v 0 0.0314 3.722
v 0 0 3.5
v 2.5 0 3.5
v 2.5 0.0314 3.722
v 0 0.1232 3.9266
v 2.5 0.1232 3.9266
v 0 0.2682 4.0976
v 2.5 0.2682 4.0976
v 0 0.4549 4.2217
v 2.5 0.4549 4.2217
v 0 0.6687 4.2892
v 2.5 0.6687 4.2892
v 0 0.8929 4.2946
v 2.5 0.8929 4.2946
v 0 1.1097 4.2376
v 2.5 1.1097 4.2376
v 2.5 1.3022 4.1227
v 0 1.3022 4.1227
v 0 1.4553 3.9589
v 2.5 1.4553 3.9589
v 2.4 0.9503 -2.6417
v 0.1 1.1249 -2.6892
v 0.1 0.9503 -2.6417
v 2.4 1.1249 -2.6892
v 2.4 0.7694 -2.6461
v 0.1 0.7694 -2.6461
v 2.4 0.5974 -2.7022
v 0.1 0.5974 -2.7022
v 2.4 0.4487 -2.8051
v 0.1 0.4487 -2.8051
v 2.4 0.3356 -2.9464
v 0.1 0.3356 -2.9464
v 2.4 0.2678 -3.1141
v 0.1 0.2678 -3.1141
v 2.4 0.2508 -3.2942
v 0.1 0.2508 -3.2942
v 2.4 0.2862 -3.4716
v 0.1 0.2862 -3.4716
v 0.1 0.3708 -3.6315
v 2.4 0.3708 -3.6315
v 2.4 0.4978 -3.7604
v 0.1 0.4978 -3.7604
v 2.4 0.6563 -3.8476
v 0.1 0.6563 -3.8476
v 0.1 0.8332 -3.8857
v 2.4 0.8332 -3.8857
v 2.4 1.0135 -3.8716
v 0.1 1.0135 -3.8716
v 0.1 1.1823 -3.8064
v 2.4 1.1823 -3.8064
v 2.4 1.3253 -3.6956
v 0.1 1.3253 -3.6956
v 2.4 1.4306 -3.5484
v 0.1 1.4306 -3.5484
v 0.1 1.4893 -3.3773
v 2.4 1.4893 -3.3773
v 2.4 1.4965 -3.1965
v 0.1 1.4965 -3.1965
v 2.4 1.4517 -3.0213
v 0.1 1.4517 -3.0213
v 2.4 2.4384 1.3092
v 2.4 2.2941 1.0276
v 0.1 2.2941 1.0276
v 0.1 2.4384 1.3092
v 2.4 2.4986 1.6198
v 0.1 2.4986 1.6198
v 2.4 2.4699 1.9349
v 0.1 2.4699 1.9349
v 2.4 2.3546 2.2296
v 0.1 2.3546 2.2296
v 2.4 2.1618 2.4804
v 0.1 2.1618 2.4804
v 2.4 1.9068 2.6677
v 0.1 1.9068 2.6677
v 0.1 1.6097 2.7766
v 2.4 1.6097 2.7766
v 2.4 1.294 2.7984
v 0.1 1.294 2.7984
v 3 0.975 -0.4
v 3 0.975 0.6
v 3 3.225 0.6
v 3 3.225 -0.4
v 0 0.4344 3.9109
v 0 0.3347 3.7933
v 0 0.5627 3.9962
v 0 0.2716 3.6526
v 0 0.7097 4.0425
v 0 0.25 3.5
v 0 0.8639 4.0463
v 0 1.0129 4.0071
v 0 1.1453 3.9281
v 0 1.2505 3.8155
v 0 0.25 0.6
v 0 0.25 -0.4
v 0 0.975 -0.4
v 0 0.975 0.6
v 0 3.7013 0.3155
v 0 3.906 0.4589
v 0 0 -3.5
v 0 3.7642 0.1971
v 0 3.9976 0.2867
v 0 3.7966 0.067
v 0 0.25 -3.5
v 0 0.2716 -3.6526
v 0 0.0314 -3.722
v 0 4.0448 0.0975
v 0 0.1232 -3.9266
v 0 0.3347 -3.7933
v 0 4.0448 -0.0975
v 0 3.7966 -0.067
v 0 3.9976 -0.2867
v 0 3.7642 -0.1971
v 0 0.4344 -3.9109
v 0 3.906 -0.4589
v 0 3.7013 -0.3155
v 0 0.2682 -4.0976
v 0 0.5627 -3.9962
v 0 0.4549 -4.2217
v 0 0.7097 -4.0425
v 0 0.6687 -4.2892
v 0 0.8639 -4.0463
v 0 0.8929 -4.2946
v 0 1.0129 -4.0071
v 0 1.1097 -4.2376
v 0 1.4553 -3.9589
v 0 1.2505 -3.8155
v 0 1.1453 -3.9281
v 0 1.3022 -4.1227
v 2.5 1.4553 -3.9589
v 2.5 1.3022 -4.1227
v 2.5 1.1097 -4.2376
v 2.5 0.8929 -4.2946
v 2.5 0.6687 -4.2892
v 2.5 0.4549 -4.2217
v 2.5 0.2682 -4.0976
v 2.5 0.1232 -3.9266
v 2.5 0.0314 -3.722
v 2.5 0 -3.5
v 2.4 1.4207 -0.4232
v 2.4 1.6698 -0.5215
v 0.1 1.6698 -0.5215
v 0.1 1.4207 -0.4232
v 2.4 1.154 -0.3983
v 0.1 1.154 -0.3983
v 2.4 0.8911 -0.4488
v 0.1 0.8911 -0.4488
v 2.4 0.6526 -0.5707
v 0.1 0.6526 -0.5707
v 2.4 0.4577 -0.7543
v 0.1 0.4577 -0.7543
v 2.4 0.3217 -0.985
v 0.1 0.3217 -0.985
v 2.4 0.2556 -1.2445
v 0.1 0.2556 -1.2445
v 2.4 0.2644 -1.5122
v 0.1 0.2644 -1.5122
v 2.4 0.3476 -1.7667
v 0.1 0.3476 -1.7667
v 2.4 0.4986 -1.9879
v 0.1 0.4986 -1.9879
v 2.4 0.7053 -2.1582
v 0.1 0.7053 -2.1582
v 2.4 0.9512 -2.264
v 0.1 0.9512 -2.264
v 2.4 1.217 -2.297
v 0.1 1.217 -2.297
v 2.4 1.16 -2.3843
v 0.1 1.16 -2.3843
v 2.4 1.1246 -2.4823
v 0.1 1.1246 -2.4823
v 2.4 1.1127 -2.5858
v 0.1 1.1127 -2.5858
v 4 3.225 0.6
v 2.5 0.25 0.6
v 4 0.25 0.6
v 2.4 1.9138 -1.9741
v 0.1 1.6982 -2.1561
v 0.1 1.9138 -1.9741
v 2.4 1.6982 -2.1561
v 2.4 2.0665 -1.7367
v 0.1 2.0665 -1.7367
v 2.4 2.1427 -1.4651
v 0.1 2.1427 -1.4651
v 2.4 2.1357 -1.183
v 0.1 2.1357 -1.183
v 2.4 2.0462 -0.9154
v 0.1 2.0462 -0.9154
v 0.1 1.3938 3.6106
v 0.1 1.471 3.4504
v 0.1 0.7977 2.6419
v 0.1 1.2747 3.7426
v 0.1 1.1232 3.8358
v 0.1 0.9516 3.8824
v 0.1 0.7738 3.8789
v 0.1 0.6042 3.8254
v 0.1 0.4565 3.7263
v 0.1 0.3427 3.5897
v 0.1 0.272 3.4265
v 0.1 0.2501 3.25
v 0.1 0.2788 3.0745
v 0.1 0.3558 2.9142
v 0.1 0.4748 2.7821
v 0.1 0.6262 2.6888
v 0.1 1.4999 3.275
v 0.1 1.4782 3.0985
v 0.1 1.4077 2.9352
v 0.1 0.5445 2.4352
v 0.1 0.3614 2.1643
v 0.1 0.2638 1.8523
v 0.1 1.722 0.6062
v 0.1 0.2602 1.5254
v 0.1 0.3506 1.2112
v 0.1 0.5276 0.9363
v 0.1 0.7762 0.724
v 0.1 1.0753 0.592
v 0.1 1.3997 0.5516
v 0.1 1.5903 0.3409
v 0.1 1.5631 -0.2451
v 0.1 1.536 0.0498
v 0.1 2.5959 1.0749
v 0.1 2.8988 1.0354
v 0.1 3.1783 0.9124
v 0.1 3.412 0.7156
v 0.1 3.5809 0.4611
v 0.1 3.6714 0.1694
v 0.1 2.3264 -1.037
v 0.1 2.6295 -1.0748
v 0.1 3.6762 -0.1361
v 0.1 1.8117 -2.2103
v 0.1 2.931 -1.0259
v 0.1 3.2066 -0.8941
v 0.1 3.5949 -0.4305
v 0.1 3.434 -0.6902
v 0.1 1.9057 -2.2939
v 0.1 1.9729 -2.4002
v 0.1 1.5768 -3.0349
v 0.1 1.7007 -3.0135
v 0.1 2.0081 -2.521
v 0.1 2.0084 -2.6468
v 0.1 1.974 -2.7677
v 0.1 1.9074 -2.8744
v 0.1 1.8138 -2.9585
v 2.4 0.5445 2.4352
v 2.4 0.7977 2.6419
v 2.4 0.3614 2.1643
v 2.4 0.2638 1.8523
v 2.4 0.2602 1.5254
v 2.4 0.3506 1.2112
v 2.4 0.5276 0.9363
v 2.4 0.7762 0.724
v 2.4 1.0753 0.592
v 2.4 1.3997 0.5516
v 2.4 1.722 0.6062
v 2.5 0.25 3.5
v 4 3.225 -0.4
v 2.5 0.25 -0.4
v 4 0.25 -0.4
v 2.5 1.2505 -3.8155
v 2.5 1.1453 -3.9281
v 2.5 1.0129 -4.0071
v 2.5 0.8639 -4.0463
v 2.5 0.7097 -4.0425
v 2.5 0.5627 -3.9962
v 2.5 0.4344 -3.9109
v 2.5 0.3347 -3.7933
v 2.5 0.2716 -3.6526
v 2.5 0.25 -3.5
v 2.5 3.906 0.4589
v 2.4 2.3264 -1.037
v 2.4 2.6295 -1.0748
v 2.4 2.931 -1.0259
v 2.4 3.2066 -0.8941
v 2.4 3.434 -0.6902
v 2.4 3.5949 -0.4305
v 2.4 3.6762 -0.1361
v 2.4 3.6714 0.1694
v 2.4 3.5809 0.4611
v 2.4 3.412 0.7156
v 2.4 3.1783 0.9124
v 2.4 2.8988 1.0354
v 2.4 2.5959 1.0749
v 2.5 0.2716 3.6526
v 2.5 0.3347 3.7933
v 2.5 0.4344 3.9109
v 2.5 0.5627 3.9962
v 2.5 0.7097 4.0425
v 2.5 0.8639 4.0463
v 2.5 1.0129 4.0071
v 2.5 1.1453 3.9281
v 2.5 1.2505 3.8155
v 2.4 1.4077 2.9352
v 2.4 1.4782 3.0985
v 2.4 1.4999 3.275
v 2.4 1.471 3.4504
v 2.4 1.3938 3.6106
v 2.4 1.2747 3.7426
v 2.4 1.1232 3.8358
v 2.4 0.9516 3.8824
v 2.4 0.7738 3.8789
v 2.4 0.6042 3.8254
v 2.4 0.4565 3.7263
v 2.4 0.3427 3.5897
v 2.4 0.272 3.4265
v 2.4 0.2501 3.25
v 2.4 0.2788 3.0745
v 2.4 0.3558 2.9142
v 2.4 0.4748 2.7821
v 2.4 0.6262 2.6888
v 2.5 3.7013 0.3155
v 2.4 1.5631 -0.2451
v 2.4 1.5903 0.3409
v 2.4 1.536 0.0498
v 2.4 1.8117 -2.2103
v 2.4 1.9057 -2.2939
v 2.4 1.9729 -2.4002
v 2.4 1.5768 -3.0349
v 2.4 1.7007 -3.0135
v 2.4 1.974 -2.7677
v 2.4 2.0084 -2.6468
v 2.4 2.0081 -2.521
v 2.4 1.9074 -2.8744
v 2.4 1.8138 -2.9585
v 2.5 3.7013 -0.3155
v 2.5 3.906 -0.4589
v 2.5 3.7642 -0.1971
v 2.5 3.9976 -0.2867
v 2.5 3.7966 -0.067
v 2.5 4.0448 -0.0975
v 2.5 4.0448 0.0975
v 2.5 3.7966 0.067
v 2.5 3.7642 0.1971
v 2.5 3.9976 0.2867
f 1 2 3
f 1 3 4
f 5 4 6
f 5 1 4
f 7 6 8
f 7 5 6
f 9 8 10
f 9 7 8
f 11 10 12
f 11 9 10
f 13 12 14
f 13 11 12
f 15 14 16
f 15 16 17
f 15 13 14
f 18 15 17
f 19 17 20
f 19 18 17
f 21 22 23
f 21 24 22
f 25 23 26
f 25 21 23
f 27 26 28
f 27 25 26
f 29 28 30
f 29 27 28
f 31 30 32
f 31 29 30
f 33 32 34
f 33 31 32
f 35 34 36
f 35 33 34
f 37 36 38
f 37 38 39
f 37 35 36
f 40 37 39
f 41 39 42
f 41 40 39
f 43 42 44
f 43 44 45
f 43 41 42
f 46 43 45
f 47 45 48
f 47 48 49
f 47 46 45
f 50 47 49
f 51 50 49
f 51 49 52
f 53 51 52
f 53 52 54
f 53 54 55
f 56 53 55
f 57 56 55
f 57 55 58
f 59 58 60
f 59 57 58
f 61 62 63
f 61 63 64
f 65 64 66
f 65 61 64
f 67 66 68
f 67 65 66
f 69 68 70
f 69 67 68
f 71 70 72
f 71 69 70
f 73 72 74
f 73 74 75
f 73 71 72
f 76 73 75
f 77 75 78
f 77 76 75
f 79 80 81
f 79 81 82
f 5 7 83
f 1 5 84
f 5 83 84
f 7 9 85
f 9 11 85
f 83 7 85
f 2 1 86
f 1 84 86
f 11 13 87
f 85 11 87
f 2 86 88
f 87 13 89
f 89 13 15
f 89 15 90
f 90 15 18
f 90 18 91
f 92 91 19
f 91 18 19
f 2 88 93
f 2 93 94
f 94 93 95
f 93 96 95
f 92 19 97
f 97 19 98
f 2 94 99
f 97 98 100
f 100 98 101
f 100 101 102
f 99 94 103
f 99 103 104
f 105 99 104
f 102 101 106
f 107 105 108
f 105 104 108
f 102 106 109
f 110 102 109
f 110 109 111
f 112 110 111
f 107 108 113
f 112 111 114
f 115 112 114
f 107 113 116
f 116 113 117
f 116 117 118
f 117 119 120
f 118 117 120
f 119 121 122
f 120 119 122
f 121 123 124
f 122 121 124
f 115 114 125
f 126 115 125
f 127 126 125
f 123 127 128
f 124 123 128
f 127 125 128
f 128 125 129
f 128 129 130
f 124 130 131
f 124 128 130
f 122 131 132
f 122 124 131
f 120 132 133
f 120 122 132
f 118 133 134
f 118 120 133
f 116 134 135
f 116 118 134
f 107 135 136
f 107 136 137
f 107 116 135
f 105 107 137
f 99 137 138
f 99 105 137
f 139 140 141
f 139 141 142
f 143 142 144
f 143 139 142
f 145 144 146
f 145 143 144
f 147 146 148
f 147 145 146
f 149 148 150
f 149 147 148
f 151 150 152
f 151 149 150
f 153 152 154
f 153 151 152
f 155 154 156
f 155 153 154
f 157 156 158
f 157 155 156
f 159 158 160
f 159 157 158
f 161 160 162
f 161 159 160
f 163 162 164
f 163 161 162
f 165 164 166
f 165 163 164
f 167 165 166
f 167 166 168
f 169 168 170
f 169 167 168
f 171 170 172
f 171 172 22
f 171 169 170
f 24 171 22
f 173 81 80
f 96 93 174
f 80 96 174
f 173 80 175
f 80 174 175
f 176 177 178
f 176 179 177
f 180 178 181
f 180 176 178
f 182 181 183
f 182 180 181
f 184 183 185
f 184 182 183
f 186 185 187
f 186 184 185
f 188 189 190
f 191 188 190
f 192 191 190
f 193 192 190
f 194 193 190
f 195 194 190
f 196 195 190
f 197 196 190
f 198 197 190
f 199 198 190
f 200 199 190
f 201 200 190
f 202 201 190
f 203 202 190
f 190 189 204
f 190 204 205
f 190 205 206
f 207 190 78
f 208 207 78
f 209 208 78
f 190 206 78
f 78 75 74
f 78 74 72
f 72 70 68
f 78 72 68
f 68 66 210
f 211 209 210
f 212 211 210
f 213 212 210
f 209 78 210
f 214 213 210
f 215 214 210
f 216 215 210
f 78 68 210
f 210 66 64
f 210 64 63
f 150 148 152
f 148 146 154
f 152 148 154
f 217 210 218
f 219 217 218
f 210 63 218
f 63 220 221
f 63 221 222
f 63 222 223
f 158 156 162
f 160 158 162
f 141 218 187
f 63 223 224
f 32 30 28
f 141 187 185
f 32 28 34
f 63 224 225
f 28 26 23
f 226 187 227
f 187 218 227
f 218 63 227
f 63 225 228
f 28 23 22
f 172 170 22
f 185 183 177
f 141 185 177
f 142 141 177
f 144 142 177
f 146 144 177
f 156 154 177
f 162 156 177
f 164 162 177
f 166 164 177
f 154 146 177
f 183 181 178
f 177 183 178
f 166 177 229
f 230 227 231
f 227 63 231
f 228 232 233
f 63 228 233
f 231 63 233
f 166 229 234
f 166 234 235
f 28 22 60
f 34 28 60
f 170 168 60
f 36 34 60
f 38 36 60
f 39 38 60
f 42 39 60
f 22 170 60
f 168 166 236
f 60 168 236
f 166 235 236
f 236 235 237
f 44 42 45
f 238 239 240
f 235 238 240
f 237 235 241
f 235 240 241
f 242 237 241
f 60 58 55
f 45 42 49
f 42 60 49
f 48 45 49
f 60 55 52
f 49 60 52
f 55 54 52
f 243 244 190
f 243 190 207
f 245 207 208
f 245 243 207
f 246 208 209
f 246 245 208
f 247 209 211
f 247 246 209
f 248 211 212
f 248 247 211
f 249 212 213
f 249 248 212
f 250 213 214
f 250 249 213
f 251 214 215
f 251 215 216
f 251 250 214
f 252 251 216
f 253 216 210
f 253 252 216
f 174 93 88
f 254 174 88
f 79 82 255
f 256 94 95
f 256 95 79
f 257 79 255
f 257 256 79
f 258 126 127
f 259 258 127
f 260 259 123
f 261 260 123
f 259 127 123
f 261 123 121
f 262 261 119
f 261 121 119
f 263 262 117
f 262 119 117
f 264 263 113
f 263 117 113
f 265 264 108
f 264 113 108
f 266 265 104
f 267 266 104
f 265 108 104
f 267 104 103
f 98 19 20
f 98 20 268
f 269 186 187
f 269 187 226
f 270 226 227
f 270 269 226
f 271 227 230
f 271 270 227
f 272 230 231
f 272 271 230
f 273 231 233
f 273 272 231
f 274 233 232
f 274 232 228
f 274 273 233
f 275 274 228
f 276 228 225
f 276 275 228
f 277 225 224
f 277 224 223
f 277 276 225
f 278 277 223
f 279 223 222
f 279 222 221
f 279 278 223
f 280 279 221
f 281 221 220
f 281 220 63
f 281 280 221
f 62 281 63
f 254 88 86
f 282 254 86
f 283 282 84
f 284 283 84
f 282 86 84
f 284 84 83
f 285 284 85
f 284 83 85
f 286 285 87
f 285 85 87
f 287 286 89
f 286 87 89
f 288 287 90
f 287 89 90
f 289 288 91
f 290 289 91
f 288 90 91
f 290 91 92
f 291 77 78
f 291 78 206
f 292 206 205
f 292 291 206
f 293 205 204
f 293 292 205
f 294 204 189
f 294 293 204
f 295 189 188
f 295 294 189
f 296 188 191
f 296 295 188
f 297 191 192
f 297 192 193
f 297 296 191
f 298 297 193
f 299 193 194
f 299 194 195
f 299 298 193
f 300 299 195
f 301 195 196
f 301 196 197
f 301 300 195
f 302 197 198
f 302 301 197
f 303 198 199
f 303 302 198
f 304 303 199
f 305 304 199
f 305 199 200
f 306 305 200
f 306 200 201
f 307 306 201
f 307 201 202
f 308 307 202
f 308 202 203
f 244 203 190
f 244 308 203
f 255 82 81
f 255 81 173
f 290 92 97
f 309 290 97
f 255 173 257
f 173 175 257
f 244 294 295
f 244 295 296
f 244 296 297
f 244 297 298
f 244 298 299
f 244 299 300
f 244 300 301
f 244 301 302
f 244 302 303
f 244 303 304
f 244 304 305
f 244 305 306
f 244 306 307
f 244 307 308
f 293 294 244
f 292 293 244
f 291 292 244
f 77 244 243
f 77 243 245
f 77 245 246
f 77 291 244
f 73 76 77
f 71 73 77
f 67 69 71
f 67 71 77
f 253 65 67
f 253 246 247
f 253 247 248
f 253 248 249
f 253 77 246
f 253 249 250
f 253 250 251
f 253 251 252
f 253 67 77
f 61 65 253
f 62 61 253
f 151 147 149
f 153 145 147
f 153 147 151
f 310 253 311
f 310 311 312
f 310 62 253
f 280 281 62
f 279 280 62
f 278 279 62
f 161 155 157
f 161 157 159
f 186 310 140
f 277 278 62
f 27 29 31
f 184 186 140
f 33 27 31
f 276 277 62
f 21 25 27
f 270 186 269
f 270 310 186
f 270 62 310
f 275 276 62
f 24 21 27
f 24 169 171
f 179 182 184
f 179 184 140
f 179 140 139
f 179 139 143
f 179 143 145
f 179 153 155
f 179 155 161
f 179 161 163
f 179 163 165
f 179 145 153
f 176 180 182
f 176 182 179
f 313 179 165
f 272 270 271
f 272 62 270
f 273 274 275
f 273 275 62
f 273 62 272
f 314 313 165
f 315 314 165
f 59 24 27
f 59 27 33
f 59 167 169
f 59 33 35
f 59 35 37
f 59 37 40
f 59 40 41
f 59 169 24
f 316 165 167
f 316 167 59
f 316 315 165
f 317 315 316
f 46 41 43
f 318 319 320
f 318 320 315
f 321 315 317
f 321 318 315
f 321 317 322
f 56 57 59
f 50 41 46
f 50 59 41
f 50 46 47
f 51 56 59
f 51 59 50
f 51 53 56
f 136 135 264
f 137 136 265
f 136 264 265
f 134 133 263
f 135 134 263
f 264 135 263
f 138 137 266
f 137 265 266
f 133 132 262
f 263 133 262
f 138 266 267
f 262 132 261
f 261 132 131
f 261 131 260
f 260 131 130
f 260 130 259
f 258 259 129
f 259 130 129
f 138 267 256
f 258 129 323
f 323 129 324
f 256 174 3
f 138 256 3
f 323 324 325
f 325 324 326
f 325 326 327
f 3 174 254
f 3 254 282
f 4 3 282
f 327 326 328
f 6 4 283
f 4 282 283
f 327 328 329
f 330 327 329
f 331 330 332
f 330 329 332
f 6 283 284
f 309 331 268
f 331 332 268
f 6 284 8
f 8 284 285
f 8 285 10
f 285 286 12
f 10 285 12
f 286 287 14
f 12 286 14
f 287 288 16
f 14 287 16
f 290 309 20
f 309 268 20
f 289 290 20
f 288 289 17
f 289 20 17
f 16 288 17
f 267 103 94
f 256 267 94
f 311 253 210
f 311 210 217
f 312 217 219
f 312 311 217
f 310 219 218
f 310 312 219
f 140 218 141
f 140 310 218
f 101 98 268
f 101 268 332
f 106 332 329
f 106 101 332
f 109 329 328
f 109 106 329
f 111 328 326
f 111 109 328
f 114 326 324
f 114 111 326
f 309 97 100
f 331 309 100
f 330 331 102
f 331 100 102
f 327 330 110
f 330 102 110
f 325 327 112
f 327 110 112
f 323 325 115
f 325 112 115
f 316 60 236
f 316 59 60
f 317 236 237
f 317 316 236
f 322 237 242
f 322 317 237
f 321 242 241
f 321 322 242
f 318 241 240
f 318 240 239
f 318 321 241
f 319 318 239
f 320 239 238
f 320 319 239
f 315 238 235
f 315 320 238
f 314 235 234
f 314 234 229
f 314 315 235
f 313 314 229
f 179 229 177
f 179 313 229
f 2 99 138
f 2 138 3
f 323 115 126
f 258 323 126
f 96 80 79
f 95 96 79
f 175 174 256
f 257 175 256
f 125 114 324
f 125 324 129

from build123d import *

# Parameters (mm, degrees)
TREADS_DEPTH                   = 2.5
CIRCLES_DEPTH                  = 1.15
CIRCLES_DEPTH_BACK             = 1.15
BOTTOM_OF_CONNECTOR_DEPTH      = 2.75
BOTTOM_OF_CONNECTOR_DEPTH_BACK = 1.25
SKETCH3_5_W                    = 1
SKETCH3_5_H                    = 0.725
SKETCH4_W                      = 1
SKETCH4_H                      = 1
TOP_OF_CONNECTOR_DEPTH         = 2.25


with BuildPart() as part:
    # Sketch1 → Treads (new body)
    with BuildSketch(Plane(origin=(0, 0, 0), x_dir=(0, 0, -1), z_dir=(1, 0, 0))):
        with BuildLine():
            Line((-3, 0), (3, 0))
            Line((3, 0), (3.5, 0))
            ThreePointArc((3.5, 0), (4.262973561, 0.55943536), (3.958861149, 1.455321635))
            Line((3.958861149, 1.455321635), (0.458861149, 3.906048019))
            ThreePointArc((0.458861149, 3.906048019), (0, 4.050726384), (-0.458861149, 3.906048019))
            Line((-0.458861149, 3.906048019), (-3.958861149, 1.455321635))
            ThreePointArc((-3.958861149, 1.455321635), (-4.262973561, 0.55943536), (-3.5, 0))
            Line((-3.5, 0), (-3, 0))
        make_face()
        with BuildLine():
            ThreePointArc((0, 3.800726384), (0.16538819, 3.775270707), (0.31546704, 3.701260008))
            Line((0.31546704, 3.701260008), (3.81546704, 1.250533624))
            ThreePointArc((3.81546704, 1.250533624), (4.024544323, 0.63461181), (3.5, 0.25))
            Line((3.5, 0.25), (-3.5, 0.25))
            ThreePointArc((-3.5, 0.25), (-4.024544323, 0.63461181), (-3.81546704, 1.250533624))
            Line((-3.81546704, 1.250533624), (-0.31546704, 3.701260008))
            ThreePointArc((-0.31546704, 3.701260008), (-0.16538819, 3.775270707), (0, 3.800726384))
        make_face(mode=Mode.SUBTRACT)
    extrude(amount=TREADS_DEPTH)

    # Sketch3<5> → Bottom of Connector (add, two sides: drawn at the far end of the back side and taken through both)
    with BuildSketch(Plane(origin=(1.25, 0, 0), x_dir=(0, 0, -1), z_dir=(1, 0, 0)).offset(-BOTTOM_OF_CONNECTOR_DEPTH_BACK)):
        with Locations((-0.1, 0.6125)):
            Rectangle(SKETCH3_5_W, SKETCH3_5_H)
    extrude(amount=BOTTOM_OF_CONNECTOR_DEPTH + BOTTOM_OF_CONNECTOR_DEPTH_BACK)

    # Sketch4 → Top of Connector (add)
    with BuildSketch(Plane(origin=(0, 0.975, 0), x_dir=(1, 0, 0), z_dir=(0, 1, 0))):
        with Locations((3.5, -0.1)):
            Rectangle(SKETCH4_W, SKETCH4_H)
    extrude(amount=TOP_OF_CONNECTOR_DEPTH)


with BuildPart() as body_2:
    # Sketch3 → Circles (new, two sides: drawn at the far end of the back side and taken through both)
    with BuildSketch(Plane(origin=(1.25, 0, 0), x_dir=(0, 0, -1), z_dir=(1, 0, 0)).offset(-CIRCLES_DEPTH_BACK)):
        with BuildLine():
            ThreePointArc((-2.641926718, 0.797718657), (-1.211224345, 0.350647058), (-0.606199298, 1.722043057))
            ThreePointArc((-0.606199298, 1.722043057), (-0.049783758, 1.535973098), (0.521460622, 1.669764503))
            ThreePointArc((0.521460622, 1.669764503), (1.112446431, 0.279457962), (2.297033365, 1.216992122))
            ThreePointArc((2.297033365, 1.216992122), (2.482253195, 1.124579804), (2.68924678, 1.124858699))
            ThreePointArc((2.68924678, 1.124858699), (3.700598319, 0.429611546), (3.021273042, 1.451725878))
            ThreePointArc((3.021273042, 1.451725878), (2.708453629, 1.995435529), (2.15606319, 1.698213434))
            ThreePointArc((2.15606319, 1.698213434), (1.60374964, 2.114699273), (0.915404217, 2.046206275))
            ThreePointArc((0.915404217, 2.046206275), (0.136054833, 3.676175239), (-1.027595727, 2.294110965))
            ThreePointArc((-1.027595727, 2.294110965), (-2.229550715, 2.354579066), (-2.798416042, 1.294039382))
            ThreePointArc((-2.798416042, 1.294039382), (-3.858203484, 0.687058875), (-2.641926718, 0.797718657))
        make_face()
    extrude(amount=CIRCLES_DEPTH + CIRCLES_DEPTH_BACK)


solid = Compound([part.part, body_2.part])
